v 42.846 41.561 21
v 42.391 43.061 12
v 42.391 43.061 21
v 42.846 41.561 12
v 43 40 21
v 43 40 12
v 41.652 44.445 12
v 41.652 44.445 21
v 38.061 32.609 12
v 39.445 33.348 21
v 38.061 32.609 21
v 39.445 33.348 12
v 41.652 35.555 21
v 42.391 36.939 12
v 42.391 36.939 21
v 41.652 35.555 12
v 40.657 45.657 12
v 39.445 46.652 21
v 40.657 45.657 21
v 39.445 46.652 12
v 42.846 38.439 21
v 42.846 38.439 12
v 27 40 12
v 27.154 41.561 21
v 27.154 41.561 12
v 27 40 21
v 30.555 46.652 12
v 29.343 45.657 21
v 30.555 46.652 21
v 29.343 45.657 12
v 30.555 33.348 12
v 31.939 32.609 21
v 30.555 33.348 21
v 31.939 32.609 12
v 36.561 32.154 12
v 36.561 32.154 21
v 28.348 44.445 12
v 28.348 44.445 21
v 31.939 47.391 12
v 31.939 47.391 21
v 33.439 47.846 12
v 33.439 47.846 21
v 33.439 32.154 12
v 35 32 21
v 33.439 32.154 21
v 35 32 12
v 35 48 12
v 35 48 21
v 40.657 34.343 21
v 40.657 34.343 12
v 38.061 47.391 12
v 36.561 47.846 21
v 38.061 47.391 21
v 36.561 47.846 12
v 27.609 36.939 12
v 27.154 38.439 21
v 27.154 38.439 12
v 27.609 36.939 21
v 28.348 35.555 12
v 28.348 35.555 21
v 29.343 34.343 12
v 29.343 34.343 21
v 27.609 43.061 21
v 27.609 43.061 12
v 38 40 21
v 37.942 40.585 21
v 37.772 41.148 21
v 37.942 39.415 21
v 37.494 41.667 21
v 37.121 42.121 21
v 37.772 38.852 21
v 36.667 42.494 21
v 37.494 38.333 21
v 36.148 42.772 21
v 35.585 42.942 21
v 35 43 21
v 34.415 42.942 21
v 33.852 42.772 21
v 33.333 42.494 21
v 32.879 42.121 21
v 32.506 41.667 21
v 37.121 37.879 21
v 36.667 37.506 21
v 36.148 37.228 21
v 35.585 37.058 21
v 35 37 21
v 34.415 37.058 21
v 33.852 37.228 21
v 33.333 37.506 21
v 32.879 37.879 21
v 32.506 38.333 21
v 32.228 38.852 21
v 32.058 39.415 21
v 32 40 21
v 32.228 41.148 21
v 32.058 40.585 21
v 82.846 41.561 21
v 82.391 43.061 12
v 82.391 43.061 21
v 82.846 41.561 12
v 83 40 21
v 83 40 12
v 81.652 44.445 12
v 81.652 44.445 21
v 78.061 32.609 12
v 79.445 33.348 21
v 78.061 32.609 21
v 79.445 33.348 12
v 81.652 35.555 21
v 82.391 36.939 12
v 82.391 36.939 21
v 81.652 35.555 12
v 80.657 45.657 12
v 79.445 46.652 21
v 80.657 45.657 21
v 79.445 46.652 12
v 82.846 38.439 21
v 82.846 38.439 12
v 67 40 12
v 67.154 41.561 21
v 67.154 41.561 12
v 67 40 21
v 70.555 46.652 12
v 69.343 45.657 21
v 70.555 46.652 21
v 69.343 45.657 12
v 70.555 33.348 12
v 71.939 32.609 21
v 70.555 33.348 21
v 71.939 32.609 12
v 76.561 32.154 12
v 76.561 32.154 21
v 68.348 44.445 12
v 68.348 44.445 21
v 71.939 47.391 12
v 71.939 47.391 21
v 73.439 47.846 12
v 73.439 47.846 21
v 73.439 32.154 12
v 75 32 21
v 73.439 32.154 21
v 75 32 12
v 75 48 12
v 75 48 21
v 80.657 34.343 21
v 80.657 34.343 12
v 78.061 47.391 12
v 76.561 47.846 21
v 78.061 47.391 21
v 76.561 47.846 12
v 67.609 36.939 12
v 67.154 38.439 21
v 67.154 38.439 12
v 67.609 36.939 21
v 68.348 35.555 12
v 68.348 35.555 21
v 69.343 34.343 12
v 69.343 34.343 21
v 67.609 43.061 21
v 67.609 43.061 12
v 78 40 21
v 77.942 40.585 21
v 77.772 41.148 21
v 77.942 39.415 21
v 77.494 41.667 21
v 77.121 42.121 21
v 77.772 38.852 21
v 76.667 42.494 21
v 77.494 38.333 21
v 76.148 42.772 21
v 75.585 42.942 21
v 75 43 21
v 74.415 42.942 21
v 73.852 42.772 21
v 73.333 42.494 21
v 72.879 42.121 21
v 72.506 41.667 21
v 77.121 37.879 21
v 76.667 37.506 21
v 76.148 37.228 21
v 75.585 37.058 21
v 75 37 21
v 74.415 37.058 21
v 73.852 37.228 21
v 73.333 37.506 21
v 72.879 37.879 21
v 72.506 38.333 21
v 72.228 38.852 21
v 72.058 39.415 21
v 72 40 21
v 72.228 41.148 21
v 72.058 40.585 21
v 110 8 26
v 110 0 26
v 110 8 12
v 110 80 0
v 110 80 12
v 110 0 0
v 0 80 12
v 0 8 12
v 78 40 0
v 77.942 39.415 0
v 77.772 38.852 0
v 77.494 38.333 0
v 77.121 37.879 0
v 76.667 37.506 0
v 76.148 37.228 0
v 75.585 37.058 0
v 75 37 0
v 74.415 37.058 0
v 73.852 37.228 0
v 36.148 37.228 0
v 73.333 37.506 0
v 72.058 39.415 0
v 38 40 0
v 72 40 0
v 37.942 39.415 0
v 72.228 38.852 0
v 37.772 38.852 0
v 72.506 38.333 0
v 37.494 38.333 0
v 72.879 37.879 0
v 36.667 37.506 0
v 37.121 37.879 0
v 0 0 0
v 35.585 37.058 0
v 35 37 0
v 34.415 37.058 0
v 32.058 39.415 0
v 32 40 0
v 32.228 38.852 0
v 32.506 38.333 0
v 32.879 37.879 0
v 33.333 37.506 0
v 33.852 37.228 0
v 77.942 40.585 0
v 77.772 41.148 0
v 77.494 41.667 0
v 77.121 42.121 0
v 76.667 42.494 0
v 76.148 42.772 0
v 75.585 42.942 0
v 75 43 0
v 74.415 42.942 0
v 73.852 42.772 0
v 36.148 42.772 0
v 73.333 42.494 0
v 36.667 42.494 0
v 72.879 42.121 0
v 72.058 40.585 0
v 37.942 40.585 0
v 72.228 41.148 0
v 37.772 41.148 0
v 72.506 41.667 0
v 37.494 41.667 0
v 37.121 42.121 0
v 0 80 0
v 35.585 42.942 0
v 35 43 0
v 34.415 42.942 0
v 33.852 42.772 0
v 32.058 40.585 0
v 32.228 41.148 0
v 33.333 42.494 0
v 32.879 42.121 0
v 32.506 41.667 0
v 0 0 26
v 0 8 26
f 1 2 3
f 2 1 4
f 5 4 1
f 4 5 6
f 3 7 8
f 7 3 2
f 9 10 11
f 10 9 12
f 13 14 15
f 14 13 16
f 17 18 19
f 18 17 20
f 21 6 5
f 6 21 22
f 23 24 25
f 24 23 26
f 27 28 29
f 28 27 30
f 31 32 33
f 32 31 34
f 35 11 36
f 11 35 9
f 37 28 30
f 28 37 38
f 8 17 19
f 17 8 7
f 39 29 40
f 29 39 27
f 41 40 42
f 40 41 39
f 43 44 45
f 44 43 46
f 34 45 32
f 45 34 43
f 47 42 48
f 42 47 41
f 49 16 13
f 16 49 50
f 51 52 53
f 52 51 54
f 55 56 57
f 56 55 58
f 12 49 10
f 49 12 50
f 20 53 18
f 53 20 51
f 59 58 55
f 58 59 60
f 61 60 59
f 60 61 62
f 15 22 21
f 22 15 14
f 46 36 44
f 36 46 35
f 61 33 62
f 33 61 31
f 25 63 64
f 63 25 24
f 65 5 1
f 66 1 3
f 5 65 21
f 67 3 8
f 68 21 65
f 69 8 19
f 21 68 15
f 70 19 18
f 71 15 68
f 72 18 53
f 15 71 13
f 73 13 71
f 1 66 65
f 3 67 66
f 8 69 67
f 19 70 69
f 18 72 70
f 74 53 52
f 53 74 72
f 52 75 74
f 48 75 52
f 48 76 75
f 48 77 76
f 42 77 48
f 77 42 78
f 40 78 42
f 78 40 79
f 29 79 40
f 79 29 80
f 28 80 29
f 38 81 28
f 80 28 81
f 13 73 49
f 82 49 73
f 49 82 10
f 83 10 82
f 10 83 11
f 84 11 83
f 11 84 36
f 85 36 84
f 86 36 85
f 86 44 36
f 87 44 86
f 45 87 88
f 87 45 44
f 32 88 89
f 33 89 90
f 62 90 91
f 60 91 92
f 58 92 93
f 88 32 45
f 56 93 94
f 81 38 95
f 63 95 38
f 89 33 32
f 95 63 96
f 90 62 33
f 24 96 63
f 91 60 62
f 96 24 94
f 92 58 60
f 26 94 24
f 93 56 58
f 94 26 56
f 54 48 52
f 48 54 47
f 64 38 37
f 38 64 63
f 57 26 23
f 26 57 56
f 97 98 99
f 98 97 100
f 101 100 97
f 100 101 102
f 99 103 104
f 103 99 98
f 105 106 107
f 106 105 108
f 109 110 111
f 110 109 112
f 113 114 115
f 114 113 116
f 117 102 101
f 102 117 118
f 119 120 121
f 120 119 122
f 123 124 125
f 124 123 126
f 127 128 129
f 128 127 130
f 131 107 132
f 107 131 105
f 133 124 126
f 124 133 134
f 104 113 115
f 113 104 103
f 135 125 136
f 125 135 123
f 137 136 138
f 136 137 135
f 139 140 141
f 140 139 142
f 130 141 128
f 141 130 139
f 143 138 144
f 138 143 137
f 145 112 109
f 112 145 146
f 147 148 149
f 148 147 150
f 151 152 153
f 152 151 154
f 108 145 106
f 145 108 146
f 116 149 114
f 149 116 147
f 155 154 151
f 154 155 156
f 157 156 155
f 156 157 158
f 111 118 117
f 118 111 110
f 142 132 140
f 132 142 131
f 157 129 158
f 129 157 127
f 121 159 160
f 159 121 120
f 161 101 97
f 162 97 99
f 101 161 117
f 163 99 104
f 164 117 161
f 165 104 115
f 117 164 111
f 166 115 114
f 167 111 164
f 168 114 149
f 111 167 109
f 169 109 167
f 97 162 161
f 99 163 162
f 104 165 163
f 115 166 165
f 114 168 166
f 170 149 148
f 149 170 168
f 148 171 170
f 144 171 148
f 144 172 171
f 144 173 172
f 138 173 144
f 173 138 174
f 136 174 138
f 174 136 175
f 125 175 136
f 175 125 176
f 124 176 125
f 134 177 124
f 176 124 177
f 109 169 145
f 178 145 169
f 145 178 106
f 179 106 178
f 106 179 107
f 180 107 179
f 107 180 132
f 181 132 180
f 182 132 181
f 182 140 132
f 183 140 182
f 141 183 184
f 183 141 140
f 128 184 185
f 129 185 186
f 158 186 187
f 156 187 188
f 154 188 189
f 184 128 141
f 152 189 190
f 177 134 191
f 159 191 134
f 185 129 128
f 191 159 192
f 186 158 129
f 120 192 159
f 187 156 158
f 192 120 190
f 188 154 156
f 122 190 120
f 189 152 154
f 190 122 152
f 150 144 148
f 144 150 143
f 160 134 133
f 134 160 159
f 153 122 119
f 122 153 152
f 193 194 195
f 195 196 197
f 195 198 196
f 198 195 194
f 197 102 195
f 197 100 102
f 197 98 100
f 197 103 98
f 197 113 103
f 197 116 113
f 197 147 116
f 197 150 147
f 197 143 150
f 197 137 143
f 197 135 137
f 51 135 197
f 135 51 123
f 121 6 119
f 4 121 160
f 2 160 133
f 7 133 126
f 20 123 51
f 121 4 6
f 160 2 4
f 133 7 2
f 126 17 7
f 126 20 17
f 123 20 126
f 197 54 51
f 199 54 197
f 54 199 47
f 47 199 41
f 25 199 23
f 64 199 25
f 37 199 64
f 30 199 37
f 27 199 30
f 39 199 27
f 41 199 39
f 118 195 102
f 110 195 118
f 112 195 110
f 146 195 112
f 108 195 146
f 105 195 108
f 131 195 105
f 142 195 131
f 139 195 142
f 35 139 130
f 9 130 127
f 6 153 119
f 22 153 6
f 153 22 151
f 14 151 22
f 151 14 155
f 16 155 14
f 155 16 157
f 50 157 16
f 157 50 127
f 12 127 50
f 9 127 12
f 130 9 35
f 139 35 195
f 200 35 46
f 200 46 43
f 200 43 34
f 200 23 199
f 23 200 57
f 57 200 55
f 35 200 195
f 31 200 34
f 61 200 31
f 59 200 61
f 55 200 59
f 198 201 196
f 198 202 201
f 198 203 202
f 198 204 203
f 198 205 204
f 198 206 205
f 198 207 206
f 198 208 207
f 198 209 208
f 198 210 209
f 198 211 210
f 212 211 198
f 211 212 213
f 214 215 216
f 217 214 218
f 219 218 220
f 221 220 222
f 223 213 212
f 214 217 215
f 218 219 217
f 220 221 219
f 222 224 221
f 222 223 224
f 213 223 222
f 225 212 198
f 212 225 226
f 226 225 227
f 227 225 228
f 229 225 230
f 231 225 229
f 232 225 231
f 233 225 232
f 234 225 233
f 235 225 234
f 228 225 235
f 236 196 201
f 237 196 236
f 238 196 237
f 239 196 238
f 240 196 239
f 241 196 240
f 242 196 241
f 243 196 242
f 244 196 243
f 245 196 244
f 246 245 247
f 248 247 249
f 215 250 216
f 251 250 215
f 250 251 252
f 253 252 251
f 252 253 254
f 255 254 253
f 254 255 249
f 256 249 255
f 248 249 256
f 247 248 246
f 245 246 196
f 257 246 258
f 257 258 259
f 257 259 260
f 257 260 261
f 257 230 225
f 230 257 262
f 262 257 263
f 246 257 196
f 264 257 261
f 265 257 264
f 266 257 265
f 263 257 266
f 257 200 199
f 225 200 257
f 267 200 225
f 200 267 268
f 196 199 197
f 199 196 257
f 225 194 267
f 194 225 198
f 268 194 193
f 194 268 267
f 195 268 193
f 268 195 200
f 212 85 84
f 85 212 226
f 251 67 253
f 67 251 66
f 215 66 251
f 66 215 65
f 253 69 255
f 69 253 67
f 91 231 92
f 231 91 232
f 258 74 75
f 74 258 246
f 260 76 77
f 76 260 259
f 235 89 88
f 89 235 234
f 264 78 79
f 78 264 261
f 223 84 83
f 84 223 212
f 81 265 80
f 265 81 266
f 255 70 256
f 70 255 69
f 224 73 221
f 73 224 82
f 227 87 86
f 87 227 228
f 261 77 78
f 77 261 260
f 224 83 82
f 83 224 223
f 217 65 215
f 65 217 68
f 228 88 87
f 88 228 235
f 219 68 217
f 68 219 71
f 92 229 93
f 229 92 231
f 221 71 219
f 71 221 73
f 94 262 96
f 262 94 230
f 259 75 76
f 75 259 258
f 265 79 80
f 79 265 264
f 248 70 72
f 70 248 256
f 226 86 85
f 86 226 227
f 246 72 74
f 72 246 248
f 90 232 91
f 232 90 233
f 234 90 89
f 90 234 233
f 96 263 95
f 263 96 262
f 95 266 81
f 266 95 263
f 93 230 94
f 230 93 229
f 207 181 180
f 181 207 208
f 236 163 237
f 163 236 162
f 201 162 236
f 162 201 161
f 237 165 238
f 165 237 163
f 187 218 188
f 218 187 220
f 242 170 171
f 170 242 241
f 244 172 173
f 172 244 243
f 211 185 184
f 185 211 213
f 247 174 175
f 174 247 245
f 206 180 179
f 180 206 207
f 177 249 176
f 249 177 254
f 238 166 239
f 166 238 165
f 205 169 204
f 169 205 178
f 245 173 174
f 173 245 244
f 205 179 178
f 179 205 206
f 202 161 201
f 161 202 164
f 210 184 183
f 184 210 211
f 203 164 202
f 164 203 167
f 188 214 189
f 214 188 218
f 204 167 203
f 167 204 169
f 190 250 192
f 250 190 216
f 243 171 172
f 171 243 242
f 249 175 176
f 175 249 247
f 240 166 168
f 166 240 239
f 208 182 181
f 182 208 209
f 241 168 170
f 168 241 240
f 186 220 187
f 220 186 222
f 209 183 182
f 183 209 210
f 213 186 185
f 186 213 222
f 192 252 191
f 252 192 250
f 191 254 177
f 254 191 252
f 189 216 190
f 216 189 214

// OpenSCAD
$fn = 32;

// ----------------------------------------------------------------------
// Drill jig: fence jig
// ----------------------------------------------------------------------

// --- parameters (mm) ---
plate_l = 110;            // plate length, X
plate_w = 80;             // plate width, Y
plate_t = 12;             // plate thickness
boss_d = 16;              // guide boss diameter
boss_h = 10;              // boss height above the plate
guide_d = 6;              // guide hole diameter
boss_pitch = 40;          // boss pitch
fence_h = 15;             // fence height above the plate
fence_t = 8;              // fence thickness

n_boss = 2;  // guide bosses
boss_x0 = (plate_l - (n_boss - 1) * boss_pitch) / 2;  // first boss X
boss_top = plate_t - 1 + boss_h;  // boss crown height
fence_top = plate_t - 1 + fence_h;  // fence crown height
total_h = max([fence_top, boss_top]);  // overall height

difference() {
  union() {
  cube([plate_l, plate_w, plate_t]);
  for (i = [0 : n_boss - 1])
    translate([boss_x0 + i * boss_pitch, plate_w / 2, plate_t - 1])
      cylinder(h = boss_h, d = boss_d);
  translate([0, 0, plate_t - 1]) cube([plate_l, fence_t, fence_h]);
  }
  for (i = [0 : n_boss - 1])
    translate([boss_x0 + i * boss_pitch, plate_w / 2, -1])
      cylinder(h = plate_t + boss_h, d = guide_d);
}
